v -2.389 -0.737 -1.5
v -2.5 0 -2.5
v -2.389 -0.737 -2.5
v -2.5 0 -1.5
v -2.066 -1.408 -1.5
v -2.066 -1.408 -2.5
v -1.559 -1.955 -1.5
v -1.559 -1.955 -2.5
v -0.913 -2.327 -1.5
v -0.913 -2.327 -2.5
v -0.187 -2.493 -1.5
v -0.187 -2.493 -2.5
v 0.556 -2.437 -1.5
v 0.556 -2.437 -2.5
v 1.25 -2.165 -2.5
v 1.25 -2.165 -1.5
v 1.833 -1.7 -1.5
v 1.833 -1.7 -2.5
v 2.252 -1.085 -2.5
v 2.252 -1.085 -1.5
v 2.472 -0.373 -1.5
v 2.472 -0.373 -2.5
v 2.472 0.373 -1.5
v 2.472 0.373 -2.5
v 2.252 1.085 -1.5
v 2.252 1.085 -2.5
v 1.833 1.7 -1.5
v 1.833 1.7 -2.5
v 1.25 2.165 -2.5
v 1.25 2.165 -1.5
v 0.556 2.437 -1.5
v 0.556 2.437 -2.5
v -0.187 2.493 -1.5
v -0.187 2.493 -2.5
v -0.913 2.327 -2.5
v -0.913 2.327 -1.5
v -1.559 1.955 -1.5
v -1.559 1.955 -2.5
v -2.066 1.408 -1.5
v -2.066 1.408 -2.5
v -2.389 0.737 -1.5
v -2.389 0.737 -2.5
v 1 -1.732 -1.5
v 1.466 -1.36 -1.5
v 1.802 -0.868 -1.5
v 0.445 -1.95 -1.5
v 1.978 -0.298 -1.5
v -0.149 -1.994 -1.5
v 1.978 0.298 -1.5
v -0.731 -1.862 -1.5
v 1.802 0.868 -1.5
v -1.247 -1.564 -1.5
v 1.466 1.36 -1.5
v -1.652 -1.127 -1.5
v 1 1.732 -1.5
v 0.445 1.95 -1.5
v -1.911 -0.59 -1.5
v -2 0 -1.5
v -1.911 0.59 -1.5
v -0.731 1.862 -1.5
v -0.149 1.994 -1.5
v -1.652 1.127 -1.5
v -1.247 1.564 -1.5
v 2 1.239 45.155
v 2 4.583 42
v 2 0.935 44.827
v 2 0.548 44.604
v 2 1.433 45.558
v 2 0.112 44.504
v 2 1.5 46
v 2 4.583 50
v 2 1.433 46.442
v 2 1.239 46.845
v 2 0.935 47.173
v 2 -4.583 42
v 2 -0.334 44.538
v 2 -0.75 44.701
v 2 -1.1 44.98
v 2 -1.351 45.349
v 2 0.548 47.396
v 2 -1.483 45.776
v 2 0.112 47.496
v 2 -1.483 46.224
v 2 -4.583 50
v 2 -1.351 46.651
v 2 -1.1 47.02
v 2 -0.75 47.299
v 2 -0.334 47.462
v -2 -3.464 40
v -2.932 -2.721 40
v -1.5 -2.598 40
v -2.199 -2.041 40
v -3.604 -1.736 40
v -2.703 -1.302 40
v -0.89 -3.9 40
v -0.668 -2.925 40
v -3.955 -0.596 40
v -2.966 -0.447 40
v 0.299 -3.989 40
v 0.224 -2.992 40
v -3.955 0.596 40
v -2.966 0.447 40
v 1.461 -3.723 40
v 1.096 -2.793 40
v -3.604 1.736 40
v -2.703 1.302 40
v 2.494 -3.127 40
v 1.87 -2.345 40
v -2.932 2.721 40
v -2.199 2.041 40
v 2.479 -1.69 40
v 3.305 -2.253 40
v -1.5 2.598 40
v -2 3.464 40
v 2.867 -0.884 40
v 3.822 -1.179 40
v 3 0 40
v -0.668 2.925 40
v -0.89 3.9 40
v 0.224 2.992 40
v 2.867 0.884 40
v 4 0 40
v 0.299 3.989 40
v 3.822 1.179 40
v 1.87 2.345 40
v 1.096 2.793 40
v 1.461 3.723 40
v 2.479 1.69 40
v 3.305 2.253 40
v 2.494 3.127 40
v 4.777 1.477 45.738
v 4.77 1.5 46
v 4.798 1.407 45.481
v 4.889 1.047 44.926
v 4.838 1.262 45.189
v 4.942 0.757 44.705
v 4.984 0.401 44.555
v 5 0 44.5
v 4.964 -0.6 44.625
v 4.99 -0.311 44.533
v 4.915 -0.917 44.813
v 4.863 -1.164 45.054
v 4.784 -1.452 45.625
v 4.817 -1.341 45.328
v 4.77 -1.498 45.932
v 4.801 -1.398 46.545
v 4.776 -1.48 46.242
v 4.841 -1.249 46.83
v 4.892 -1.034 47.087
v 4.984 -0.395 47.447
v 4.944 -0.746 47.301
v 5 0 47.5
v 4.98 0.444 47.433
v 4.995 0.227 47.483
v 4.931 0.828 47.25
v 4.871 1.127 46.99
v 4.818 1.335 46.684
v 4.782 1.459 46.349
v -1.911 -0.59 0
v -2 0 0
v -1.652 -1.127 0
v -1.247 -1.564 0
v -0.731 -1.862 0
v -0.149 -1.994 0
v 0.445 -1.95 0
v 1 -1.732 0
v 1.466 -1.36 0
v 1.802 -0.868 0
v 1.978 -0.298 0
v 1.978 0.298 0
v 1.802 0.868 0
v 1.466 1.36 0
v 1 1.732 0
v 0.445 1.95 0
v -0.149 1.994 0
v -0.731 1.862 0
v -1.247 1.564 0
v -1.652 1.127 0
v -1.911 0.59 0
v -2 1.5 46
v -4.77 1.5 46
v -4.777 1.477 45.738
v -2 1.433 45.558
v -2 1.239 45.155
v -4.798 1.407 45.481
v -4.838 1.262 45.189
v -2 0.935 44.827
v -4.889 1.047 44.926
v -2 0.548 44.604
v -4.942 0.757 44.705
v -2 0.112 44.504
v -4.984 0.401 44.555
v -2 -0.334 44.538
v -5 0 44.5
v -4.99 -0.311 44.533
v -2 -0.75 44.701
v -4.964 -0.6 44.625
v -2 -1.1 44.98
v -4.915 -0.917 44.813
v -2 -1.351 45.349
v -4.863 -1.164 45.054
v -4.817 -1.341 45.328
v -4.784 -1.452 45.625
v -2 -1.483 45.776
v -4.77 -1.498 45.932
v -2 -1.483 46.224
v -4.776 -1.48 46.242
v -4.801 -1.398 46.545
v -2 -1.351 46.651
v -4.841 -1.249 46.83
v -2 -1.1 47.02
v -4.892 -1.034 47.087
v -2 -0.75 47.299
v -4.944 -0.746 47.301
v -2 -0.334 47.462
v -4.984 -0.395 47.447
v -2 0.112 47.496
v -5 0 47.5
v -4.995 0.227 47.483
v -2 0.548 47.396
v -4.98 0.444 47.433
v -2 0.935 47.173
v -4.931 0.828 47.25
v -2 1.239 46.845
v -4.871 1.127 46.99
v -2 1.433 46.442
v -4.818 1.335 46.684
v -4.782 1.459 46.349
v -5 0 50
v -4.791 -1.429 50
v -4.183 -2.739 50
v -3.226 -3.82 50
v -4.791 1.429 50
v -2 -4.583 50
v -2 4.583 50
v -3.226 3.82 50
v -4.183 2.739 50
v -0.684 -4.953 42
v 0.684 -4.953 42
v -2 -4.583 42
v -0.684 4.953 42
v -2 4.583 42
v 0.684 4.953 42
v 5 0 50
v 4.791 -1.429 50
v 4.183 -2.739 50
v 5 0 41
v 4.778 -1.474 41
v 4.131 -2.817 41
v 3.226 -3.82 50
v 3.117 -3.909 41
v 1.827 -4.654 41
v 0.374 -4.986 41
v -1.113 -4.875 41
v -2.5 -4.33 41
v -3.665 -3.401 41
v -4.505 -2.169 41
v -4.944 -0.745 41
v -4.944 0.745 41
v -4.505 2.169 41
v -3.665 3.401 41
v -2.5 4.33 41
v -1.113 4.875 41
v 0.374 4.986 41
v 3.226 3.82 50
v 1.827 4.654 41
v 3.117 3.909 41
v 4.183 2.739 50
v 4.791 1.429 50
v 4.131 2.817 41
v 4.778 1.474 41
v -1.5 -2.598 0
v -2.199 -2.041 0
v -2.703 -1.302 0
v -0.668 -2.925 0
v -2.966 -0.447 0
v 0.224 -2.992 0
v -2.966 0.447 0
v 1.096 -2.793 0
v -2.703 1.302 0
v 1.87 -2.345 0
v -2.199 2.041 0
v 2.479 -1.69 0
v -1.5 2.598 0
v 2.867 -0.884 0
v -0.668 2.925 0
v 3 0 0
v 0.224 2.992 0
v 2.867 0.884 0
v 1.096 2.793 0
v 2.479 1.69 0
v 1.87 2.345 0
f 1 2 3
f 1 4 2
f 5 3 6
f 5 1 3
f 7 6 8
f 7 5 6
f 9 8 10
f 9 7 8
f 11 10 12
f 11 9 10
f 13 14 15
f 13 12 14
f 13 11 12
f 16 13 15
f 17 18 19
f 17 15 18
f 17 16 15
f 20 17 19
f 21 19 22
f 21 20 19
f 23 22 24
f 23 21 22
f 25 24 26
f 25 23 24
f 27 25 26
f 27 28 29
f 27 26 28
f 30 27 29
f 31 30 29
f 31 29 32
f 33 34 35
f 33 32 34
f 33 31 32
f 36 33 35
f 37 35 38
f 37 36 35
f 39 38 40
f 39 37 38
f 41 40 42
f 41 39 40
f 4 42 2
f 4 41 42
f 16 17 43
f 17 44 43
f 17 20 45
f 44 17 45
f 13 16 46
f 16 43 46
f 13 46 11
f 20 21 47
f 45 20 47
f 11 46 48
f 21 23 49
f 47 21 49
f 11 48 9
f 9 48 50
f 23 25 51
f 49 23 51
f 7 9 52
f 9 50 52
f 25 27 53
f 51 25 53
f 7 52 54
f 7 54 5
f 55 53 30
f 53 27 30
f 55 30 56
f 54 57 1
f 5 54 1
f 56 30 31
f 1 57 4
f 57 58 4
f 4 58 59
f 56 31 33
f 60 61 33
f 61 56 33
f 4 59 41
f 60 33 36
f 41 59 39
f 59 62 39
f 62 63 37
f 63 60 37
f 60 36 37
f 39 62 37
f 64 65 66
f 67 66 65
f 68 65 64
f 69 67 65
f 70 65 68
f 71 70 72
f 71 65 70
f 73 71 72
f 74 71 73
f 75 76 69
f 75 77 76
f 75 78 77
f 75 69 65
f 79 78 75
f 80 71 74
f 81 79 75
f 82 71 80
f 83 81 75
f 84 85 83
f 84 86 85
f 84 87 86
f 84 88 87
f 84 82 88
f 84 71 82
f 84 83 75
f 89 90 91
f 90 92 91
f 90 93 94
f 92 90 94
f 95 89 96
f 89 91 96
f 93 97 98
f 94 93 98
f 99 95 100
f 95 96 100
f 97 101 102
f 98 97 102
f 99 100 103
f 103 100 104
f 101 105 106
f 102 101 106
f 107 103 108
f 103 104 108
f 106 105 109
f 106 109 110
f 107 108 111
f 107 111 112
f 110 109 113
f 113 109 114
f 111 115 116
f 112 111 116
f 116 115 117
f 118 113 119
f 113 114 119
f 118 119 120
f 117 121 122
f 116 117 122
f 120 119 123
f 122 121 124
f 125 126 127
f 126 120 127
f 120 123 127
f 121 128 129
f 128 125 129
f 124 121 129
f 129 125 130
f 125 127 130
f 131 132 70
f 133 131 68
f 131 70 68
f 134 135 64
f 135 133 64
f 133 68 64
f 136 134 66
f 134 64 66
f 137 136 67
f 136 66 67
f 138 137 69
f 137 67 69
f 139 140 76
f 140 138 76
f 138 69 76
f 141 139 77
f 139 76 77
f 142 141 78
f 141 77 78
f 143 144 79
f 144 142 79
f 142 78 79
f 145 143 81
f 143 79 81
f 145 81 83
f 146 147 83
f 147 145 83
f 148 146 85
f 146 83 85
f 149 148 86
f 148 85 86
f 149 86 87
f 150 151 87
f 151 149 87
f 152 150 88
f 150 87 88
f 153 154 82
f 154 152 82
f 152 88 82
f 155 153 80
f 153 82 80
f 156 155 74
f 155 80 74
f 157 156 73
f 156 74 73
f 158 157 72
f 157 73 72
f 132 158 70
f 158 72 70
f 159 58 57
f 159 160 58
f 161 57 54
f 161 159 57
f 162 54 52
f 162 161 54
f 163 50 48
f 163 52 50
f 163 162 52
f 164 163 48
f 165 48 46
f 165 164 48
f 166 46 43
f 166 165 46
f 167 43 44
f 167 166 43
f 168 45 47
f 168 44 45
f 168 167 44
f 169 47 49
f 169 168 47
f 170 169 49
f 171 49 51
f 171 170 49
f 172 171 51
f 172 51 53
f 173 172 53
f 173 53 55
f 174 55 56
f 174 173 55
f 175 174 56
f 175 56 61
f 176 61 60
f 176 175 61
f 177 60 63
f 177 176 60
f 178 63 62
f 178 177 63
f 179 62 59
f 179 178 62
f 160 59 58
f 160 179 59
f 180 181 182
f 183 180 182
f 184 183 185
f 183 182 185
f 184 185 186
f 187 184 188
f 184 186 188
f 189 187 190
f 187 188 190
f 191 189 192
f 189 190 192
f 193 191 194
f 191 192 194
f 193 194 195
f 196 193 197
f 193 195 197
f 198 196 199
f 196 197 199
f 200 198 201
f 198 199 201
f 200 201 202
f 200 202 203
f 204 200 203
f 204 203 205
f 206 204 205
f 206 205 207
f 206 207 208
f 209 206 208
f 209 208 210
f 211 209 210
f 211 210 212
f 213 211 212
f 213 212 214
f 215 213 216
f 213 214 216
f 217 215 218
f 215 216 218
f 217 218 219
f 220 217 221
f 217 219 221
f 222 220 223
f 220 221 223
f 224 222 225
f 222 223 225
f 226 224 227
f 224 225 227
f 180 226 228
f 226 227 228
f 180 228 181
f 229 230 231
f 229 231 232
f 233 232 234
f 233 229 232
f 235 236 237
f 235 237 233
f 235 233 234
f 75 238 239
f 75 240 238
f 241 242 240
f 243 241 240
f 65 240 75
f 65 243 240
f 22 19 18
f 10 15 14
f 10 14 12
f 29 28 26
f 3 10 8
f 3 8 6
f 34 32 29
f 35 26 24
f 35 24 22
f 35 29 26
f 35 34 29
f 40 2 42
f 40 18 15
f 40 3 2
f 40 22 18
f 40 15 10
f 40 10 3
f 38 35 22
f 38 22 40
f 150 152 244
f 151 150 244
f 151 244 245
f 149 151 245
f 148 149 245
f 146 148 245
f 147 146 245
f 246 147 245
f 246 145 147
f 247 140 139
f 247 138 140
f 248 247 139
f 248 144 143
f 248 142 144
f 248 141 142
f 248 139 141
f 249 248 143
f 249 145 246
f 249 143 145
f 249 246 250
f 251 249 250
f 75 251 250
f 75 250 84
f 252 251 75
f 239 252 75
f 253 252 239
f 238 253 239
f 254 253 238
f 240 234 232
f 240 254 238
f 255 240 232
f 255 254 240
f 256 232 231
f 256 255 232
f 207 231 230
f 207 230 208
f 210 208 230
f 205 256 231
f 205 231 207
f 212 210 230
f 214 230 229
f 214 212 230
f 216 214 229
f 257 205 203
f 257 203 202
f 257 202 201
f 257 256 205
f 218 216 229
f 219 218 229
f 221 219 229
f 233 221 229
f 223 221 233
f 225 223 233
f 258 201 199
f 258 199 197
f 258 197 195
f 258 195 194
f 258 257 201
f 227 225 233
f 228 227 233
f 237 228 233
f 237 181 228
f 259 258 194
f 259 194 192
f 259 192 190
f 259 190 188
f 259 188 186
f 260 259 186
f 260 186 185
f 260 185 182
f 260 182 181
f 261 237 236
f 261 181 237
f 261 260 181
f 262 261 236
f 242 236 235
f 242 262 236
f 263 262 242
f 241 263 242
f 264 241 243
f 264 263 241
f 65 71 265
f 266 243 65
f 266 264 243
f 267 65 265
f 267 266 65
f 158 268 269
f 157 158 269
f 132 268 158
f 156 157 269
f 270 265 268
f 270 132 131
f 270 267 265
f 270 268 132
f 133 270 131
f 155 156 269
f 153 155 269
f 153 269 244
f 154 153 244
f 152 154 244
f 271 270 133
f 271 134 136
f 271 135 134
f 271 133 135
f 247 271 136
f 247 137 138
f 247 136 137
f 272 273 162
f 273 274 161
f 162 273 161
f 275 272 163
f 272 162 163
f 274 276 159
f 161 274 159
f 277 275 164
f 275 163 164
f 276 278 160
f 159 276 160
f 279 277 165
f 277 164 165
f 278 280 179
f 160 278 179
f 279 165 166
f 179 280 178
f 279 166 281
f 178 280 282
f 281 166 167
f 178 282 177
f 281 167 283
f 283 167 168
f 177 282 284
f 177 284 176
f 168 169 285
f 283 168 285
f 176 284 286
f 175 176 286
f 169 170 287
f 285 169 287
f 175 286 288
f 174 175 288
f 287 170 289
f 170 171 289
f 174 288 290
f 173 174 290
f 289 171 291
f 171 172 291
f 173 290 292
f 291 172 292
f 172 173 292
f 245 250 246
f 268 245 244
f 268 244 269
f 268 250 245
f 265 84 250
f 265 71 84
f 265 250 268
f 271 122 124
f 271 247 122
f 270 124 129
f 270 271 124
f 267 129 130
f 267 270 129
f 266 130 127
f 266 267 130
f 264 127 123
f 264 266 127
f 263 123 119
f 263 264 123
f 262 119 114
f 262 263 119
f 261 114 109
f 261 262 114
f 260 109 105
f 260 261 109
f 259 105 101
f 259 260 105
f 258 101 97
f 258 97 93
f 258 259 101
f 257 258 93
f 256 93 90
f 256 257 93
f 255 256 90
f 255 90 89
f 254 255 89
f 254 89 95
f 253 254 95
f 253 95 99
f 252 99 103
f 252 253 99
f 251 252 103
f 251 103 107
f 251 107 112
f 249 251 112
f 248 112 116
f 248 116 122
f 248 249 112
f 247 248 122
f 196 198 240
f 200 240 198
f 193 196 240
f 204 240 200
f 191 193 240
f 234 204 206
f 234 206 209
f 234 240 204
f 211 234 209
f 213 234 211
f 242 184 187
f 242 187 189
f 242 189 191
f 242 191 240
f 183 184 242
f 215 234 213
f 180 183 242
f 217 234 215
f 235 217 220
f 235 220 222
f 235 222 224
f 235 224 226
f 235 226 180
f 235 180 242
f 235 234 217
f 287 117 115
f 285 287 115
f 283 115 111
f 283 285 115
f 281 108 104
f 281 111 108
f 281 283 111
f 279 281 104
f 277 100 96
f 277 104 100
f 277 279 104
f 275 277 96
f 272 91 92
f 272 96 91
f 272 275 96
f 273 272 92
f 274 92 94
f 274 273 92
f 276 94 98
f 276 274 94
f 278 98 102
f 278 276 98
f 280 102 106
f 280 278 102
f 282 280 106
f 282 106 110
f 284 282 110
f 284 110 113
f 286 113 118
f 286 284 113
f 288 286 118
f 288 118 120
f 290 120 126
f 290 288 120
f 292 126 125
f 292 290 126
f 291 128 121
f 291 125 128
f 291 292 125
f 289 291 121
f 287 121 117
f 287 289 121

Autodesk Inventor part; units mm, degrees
sketch "Эскиз1" plane through (0, 0, 0) normal (0, 0, 1) x (1, 0, 0)
  circle A0 centre (0, 0) radius 3
  dimension "d0" = 6
extrude "Выдавливание1" add sketch "Эскиз1" along normal blind 40
ref_plane "РабПлоскость1" through (0, 0, 40) normal (0, 0, 1) x (1, 0, 0)
sketch "Эскиз2" plane through (0, 0, 40) normal (0, 0, 1) x (1, 0, 0)
  circle A0 centre (0, 0) radius 5
  dimension "d4" = 10
extrude "Выдавливание2" add sketch "Эскиз2" along normal blind 10
ref_plane "РабПлоскость2" through (0, 0, 50) normal (0, 0, 1) x (1, 0, 0)
sketch "Эскиз3" plane through (0, 0, 50) normal (0, 0, 1) x (1, 0, 0)
  line L0 (-2, 8) -> (2, 8)
  line L1 (2, 8) -> (2, -7)
  line L2 (2, -7) -> (-2, -7)
  line L3 (-2, -7) -> (-2, 8)
  point P0 (0, 0)
  dimension "d8" = 4
  dimension "d9" = 15
extrude "Выдавливание3" cut sketch "Эскиз3" against normal blind 8
ref_plane "РабПлоскость3" through (-5, 0, 40) normal (1, 0, 0) x (0, 1, 0)
sketch "Эскиз4" plane through (-5, 0, 40) normal (1, 0, 0) x (0, 1, 0)
  circle A0 centre (0, 6) radius 1.5
  line L0 (4.5826, 10) -> (-4.5826, 10) projected
  point P0 (0, -40)
  dimension "d12" = 3
  dimension "d13" = 4
extrude "Выдавливание4" cut sketch "Эскиз4" along normal blind 10
ref_plane "РабПлоскость4" through (0, 0, 0) normal (0, 0, -1) x (-1, 0, 0)
sketch "Эскиз5" plane through (0, 0, 0) normal (0, 0, -1) x (-1, 0, 0)
  circle A0 centre (0, 0) radius 2
  dimension "d17" = 4
extrude "Выдавливание5" add sketch "Эскиз5" along normal blind 1.5
ref_plane "РабПлоскость5" through (0, 0, -1.5) normal (0, 0, -1) x (-1, 0, 0)
sketch "Эскиз6" plane through (0, 0, -1.5) normal (0, 0, -1) x (-1, 0, 0)
  circle A0 centre (0, 0) radius 2.5
  dimension "d21" = 5
extrude "Выдавливание6" add sketch "Эскиз6" along normal blind 1
chamfer "Фаска1" distance 1 angle 45 1 edges at (-5, 0, 40)
thread "Резьба1" size "M6x1" class "6g" standard "ANSI Metric M Profile" full length
properties part number "крепёж"
